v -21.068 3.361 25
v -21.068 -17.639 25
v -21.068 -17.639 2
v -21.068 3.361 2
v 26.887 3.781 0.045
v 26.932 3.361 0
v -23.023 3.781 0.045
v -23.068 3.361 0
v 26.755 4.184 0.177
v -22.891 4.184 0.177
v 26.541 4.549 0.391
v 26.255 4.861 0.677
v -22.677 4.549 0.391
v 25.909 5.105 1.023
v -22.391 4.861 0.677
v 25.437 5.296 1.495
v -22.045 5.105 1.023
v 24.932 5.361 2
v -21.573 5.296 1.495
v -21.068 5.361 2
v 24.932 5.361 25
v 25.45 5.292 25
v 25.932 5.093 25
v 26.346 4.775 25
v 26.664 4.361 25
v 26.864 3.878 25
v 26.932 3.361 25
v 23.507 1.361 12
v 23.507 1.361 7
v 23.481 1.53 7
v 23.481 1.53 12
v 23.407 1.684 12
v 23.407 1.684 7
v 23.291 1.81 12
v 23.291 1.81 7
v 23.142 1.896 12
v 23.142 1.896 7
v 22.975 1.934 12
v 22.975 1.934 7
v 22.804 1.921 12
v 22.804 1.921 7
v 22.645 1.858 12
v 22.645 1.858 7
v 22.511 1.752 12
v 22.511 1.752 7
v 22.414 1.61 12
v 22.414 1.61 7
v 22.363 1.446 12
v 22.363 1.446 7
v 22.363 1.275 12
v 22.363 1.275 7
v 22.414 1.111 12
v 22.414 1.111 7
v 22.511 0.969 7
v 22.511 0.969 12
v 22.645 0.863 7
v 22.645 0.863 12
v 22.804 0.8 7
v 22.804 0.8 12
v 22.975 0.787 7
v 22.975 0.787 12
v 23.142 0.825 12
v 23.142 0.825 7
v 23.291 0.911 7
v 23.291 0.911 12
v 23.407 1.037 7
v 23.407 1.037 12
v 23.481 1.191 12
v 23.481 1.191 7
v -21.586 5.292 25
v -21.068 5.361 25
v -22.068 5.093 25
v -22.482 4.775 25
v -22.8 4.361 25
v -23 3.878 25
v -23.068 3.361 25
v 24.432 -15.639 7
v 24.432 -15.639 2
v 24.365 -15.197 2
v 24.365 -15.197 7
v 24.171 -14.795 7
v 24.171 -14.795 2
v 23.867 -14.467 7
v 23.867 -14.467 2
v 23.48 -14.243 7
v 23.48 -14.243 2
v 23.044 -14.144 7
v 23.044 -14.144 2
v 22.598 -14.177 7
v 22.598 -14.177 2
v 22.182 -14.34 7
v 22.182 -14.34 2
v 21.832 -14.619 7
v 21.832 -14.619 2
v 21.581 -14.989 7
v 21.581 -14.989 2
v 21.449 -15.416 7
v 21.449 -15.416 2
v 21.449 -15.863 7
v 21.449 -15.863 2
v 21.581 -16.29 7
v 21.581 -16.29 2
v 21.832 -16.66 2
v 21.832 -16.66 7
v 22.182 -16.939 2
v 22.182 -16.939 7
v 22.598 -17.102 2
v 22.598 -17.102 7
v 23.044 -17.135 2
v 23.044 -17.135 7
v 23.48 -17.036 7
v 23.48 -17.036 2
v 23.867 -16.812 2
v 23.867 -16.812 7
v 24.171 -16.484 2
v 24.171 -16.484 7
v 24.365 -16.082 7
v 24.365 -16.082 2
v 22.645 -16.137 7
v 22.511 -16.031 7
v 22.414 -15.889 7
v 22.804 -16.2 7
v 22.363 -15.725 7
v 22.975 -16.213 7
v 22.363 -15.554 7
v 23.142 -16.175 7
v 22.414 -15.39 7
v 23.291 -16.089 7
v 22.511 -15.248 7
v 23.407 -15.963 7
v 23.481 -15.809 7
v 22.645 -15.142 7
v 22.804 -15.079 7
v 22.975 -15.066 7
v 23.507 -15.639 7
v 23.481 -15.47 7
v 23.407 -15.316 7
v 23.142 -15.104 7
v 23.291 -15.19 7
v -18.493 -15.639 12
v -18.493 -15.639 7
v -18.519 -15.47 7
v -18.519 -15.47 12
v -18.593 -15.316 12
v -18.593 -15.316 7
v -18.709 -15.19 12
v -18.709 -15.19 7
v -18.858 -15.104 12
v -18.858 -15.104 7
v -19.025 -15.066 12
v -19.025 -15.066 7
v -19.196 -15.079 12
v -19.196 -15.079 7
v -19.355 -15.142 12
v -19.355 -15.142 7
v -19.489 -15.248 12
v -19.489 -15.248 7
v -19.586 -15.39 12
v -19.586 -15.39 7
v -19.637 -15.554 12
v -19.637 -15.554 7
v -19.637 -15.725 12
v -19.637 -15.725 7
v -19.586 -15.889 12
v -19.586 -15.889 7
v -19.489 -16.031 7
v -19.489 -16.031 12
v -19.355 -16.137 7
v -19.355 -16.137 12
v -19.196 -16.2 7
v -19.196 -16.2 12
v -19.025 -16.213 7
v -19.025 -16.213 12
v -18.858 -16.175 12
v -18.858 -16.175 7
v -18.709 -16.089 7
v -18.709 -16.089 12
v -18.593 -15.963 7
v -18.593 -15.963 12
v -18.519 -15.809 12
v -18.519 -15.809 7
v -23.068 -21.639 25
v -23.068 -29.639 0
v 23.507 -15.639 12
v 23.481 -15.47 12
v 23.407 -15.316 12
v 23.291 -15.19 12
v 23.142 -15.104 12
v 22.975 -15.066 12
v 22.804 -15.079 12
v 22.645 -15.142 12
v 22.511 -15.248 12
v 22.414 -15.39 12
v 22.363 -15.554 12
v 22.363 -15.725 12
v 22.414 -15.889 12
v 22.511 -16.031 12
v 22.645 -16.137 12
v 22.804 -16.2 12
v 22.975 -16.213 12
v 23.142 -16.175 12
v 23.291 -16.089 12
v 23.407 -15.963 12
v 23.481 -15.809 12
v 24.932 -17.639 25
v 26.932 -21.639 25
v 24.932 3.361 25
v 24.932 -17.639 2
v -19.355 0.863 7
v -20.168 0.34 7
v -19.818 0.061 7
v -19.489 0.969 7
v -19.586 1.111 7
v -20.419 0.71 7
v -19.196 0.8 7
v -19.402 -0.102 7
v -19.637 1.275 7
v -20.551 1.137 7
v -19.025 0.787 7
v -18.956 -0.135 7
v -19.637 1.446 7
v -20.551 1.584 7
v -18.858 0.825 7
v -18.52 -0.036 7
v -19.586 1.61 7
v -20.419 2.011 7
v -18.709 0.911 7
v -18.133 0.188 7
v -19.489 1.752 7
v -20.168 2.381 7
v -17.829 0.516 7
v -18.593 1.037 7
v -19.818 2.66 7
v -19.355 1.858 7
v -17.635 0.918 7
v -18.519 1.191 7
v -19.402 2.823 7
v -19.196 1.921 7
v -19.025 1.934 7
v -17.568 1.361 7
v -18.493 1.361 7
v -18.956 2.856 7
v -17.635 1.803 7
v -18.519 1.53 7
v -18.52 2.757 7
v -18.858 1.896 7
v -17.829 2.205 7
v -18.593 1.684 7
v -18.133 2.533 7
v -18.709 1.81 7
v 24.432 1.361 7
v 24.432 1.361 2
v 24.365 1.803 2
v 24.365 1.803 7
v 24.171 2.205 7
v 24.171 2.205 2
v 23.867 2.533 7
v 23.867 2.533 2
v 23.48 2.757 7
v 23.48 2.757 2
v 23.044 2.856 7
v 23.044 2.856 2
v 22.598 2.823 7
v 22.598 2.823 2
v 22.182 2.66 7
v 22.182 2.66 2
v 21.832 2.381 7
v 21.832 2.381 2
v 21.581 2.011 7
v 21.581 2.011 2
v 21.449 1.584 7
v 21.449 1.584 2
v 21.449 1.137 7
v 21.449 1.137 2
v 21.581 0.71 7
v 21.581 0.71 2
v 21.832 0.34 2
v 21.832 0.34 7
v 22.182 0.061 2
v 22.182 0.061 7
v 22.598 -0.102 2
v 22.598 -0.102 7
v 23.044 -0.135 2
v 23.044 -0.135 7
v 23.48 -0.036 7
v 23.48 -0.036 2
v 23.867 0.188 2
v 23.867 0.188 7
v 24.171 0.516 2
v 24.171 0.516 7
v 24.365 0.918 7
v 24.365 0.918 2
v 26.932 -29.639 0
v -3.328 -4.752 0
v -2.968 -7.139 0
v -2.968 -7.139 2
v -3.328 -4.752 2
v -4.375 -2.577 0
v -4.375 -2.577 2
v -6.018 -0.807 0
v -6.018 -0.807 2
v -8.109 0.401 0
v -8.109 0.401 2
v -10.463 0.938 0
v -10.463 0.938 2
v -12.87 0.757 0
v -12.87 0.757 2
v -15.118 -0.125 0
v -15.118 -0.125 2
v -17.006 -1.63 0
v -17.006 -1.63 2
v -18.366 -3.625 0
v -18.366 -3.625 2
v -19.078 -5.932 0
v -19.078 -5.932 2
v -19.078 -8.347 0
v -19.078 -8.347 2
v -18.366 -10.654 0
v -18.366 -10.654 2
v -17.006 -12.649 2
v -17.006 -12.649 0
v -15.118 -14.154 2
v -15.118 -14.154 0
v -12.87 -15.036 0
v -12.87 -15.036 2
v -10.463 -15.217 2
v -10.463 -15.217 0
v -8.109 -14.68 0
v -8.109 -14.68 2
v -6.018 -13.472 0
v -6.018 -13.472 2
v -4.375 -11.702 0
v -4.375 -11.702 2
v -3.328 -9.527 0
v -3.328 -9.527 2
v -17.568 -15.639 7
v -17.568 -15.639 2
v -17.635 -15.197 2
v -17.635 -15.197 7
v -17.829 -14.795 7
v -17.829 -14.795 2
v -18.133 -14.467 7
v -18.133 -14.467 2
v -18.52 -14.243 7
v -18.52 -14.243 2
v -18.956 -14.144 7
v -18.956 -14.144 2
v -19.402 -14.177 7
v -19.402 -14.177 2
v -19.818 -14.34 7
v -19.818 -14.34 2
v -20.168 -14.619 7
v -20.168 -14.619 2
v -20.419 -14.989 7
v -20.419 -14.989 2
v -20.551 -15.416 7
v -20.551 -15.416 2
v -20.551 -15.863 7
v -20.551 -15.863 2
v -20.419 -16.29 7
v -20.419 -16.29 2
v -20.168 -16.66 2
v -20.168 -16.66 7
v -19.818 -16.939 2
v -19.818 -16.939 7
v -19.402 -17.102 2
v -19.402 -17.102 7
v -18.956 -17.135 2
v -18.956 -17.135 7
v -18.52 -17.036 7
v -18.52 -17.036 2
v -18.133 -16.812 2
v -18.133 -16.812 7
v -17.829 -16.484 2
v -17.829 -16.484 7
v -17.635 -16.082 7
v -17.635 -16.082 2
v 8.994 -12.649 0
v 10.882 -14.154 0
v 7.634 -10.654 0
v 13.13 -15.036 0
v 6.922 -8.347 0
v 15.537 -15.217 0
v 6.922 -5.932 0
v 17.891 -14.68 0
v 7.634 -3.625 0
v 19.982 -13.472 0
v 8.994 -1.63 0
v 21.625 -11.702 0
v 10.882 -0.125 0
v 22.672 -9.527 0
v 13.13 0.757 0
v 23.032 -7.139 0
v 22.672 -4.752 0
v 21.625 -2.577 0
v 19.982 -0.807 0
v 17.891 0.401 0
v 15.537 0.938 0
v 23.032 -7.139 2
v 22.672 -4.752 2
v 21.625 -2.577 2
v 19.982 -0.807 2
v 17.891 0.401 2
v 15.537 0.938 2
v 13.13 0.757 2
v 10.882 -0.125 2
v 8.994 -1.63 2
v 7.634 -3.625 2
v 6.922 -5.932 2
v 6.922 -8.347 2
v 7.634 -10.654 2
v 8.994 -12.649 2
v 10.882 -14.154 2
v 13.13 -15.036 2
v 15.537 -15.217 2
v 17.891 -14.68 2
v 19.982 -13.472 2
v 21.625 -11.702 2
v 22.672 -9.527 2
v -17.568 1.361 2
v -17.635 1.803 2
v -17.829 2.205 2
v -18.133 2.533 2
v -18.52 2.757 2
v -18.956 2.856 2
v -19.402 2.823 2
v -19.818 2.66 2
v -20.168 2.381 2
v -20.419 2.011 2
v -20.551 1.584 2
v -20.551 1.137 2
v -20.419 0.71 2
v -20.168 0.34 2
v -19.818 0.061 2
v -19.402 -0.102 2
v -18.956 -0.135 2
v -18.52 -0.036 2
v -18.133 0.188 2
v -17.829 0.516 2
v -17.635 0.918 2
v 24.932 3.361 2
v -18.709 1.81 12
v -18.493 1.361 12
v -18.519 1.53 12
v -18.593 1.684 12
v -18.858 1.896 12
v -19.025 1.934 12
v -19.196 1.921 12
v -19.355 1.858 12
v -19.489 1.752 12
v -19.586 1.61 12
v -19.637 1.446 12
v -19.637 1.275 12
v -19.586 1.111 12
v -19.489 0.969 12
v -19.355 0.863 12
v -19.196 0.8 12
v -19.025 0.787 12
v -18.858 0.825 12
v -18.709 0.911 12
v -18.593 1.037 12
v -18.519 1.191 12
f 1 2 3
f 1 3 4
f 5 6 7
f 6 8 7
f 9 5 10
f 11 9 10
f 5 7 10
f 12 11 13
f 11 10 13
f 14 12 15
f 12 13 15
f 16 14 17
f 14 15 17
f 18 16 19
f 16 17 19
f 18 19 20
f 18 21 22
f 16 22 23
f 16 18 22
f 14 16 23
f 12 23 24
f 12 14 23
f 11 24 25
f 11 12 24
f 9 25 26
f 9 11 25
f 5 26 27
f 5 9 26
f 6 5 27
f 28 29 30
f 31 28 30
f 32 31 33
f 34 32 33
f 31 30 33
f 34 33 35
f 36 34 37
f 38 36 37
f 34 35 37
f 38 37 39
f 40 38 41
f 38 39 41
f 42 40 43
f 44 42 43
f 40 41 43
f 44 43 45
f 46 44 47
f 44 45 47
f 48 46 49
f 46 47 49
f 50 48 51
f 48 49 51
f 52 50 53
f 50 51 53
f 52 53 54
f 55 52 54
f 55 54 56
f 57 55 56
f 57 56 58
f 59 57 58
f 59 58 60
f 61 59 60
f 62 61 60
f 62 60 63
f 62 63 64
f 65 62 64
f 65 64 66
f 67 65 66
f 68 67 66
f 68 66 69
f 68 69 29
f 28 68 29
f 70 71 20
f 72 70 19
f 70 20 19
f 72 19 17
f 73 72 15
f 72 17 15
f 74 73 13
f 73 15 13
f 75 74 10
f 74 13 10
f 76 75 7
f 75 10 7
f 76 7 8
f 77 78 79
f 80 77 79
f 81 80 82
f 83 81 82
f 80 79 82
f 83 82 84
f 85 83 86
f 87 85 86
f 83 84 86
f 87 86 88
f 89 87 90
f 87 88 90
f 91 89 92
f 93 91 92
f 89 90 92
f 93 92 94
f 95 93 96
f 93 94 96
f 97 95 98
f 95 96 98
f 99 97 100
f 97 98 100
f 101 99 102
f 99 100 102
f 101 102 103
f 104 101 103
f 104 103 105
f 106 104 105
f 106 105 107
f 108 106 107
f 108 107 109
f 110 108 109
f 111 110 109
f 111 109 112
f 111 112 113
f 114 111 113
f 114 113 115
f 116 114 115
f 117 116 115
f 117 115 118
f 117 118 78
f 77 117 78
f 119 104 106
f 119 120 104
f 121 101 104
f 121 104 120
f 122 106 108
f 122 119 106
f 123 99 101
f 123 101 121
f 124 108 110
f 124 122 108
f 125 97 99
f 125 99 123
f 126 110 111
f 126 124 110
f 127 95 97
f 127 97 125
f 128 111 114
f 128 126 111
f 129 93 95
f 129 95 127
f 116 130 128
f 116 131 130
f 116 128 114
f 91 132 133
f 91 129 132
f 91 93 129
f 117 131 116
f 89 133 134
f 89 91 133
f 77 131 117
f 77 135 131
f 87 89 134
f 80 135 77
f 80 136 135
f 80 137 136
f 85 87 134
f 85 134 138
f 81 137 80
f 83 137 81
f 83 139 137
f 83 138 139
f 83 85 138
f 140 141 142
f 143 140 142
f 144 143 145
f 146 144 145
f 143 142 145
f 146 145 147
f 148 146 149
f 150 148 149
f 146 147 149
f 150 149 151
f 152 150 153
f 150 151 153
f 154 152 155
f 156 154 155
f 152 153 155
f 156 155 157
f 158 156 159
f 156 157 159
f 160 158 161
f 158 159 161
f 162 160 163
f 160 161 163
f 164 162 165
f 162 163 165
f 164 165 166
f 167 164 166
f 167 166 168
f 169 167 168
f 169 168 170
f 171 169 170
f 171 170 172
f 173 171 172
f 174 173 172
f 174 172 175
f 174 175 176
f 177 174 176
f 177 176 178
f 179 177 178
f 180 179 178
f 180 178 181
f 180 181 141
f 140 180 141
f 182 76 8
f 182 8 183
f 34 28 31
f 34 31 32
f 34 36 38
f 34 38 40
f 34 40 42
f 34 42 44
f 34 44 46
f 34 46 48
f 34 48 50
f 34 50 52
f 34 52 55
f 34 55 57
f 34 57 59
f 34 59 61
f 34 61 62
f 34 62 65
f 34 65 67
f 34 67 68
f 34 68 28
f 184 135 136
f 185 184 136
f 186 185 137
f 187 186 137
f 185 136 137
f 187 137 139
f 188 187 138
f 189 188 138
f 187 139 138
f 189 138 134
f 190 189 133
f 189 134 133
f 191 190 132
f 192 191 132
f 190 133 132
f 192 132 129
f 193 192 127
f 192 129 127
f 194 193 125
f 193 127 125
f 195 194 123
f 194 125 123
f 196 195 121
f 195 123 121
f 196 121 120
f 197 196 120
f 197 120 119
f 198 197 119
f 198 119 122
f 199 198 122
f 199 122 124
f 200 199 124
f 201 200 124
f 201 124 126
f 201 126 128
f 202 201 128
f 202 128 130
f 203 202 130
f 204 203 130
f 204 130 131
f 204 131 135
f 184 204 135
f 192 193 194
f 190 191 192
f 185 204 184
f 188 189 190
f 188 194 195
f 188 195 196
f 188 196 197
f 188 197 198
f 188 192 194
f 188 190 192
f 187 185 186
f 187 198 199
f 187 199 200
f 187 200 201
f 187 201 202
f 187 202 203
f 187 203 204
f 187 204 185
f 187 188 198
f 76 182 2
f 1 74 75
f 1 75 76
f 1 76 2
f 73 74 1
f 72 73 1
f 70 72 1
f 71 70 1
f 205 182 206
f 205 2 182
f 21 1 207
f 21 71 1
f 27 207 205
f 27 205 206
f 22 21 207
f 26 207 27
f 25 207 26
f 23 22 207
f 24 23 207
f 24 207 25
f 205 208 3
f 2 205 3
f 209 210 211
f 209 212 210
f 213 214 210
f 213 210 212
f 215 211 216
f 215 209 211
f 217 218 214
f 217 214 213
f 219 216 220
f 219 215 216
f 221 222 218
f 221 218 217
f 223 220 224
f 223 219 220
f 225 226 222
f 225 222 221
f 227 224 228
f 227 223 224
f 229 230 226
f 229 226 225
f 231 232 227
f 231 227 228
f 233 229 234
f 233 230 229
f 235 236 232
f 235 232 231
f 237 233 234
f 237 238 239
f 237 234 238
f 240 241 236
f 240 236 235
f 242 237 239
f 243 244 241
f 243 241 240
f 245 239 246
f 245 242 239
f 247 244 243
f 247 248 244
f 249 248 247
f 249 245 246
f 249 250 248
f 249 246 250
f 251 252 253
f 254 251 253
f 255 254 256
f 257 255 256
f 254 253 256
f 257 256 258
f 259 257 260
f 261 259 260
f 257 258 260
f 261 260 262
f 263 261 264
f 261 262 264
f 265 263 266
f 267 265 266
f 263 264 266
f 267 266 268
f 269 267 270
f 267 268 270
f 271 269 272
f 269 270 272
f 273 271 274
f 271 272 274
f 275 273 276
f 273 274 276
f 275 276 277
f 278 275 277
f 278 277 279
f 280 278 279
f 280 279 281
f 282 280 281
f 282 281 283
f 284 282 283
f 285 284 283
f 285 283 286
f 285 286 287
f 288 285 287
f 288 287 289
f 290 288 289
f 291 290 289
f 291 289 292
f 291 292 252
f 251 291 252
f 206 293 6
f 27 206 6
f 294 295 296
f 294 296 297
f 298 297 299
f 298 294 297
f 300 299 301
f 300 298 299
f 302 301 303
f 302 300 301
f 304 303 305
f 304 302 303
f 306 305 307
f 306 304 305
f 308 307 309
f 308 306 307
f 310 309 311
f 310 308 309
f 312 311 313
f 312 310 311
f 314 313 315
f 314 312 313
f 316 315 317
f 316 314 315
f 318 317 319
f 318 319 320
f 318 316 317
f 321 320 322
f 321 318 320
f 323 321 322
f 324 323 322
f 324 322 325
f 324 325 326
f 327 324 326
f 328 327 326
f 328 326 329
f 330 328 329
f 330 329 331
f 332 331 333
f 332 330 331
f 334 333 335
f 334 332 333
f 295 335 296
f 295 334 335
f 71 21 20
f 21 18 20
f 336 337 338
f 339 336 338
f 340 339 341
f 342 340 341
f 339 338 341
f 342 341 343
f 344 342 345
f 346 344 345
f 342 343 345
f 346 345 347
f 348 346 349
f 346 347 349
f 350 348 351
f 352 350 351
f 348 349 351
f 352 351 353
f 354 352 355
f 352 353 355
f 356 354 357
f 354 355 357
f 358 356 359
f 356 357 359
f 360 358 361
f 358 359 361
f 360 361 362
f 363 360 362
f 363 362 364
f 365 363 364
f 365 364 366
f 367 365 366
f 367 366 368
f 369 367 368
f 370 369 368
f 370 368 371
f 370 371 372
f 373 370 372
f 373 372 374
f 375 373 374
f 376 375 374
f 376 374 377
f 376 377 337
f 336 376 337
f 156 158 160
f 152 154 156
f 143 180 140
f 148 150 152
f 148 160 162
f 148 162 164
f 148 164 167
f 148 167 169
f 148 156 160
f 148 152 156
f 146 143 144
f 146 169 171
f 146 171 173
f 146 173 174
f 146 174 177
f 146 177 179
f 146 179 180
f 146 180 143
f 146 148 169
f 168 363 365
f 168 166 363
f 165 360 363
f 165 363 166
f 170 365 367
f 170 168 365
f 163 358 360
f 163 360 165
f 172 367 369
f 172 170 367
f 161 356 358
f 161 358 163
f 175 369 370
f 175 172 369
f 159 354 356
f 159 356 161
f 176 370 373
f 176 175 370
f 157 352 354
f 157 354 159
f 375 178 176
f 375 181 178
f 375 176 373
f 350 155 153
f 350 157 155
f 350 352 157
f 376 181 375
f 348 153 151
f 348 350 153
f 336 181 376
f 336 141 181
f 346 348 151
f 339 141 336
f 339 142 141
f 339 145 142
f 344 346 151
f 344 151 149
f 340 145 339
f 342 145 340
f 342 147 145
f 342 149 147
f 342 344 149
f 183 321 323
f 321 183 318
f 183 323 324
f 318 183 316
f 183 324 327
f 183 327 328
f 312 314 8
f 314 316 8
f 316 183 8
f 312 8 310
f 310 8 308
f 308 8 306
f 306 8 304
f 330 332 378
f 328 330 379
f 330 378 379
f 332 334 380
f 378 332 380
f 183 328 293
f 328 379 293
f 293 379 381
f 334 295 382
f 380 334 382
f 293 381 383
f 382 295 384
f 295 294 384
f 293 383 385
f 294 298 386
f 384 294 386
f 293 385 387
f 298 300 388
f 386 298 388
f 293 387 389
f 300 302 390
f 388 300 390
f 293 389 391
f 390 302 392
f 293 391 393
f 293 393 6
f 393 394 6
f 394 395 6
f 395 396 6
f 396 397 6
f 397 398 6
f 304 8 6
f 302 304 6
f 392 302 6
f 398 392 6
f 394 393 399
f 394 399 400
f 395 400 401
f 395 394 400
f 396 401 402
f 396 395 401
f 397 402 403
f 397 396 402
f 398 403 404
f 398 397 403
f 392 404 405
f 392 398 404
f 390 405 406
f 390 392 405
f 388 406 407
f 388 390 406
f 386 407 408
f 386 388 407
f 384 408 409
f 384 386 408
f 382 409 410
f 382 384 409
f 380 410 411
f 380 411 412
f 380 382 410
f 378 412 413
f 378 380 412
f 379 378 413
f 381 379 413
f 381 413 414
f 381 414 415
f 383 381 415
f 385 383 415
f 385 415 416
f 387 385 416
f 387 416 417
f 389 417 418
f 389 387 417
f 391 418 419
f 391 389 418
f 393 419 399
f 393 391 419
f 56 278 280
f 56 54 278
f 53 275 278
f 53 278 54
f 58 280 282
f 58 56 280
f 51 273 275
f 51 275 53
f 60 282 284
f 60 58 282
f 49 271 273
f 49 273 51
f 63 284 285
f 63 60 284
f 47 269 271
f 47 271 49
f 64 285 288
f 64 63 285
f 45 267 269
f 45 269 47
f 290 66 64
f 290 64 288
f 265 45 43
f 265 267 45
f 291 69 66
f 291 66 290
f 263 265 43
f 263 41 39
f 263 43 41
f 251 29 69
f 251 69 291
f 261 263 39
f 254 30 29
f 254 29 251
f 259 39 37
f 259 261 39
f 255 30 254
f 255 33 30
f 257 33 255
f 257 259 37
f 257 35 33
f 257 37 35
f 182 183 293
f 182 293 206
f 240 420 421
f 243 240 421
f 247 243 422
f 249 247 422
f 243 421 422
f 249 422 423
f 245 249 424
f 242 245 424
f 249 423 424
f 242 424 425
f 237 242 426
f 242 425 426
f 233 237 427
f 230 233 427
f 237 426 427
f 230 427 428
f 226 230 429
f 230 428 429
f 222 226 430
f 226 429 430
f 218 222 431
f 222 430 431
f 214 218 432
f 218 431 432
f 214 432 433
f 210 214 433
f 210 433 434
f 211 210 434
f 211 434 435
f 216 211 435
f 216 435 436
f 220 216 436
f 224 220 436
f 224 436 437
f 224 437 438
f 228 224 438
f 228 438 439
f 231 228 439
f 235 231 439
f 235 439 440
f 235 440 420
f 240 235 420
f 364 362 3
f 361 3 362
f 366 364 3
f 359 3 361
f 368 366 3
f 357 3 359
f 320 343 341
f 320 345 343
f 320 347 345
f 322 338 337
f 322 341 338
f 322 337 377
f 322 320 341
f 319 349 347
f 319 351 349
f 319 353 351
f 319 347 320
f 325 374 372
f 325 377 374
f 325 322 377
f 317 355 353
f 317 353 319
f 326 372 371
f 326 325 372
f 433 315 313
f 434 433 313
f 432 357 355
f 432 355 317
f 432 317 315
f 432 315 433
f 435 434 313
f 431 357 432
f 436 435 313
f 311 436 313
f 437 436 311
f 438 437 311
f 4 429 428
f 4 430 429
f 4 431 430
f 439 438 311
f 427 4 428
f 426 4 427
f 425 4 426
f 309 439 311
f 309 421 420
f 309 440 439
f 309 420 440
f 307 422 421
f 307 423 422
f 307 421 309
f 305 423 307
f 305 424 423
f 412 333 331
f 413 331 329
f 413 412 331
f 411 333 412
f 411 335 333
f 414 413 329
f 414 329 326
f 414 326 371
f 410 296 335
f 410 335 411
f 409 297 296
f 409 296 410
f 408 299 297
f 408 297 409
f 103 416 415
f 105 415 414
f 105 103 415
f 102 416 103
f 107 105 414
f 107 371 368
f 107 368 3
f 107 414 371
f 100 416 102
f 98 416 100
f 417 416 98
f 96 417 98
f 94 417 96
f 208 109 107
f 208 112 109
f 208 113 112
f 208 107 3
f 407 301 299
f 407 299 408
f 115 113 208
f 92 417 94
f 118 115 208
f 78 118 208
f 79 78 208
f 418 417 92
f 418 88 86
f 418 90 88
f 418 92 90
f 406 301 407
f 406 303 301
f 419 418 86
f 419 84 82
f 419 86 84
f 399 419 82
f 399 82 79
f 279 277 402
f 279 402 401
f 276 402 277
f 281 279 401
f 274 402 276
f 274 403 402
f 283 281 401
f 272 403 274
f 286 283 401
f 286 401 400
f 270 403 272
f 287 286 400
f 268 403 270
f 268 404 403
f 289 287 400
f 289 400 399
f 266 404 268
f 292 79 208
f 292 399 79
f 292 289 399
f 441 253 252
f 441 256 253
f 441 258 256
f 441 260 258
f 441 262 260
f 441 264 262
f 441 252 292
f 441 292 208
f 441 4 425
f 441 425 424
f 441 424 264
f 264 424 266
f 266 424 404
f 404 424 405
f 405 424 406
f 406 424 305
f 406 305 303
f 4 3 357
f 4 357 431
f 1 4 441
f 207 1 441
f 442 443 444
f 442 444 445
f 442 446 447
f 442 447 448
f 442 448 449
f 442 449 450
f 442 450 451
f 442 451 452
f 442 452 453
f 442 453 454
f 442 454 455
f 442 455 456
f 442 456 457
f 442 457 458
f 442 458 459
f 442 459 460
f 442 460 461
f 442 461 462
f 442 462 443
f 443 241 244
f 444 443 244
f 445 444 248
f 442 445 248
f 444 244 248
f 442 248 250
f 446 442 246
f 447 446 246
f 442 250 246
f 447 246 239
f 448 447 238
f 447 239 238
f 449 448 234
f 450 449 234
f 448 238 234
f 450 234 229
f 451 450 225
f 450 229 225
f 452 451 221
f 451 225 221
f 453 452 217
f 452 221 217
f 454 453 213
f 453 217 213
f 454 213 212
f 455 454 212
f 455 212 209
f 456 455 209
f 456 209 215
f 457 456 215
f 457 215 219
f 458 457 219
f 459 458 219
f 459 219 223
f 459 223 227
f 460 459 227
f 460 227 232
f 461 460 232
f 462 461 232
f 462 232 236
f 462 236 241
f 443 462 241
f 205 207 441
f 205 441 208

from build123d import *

# Parameters (mm, degrees)
F0_W     = 46
F0_H     = 2
F0_R     = 1.5
F0_R_2   = 0.575
F0_H_2   = 21
F0_R_3   = 8.1
F1_DEPTH = 2
F2_DEPTH = 25
F3_DEPTH = 7
F4_DEPTH = 12
F5_R     = 2
F7_DEPTH = 52


with BuildPart() as f1:
    # F0 (on Top) → F1 (new body)
    with BuildSketch(Plane.XY):
        with Locations((1.93201, 4.360505)):
            Rectangle(F0_W, F0_H)
        with Locations((-19.06799, 1.360505)):
            Circle(F0_R)
        with Locations((-19.06799, 1.360505)):
            Circle(F0_R_2, mode=Mode.SUBTRACT)
        with Locations((22.93201, -15.639495)):
            Circle(F0_R)
        with Locations((22.93201, -15.639495)):
            Circle(F0_R_2, mode=Mode.SUBTRACT)
        with Locations((22.93201, 1.360505)):
            Circle(F0_R)
        with Locations((22.93201, 1.360505)):
            Circle(F0_R_2, mode=Mode.SUBTRACT)
        with Locations((-19.06799, -15.639495)):
            Circle(F0_R)
        with Locations((-19.06799, -15.639495)):
            Circle(F0_R_2, mode=Mode.SUBTRACT)
        with Locations((1.93201, -7.139495)):
            Rectangle(F0_W, F0_H_2)
        with Locations((-19.06799, -15.639495)):
            Circle(F0_R, mode=Mode.SUBTRACT)
        with Locations((22.93201, -15.639495)):
            Circle(F0_R, mode=Mode.SUBTRACT)
        with Locations((-11.06799, -7.139495)):
            Circle(F0_R_3, mode=Mode.SUBTRACT)
        with Locations((-19.06799, 1.360505)):
            Circle(F0_R, mode=Mode.SUBTRACT)
        with Locations((14.93201, -7.139495)):
            Circle(F0_R_3, mode=Mode.SUBTRACT)
        with Locations((22.93201, 1.360505)):
            Circle(F0_R, mode=Mode.SUBTRACT)
        Polygon((-21.06799, 5.360505), (-23.06799, 5.360505), (-23.06799, -19.639495), (-21.06799, -19.639495), (-21.06799, -17.639495), (-21.06799, 3.360505), align=None)
        Polygon((-21.06799, -17.639495), (-21.06799, -19.639495), (26.93201, -19.639495), (26.93201, -17.639495), (24.93201, -17.639495), align=None)
        Polygon((26.93201, 5.360505), (24.93201, 5.360505), (24.93201, 3.360505), (24.93201, -17.639495), (26.93201, -17.639495), align=None)
    extrude(amount=F1_DEPTH)

    # F0 (on Top) → F2 (join)
    with BuildSketch(Plane.XY):
        Polygon((-21.06799, 5.360505), (-23.06799, 5.360505), (-23.06799, -19.639495), (-21.06799, -19.639495), (-21.06799, -17.639495), (-21.06799, 3.360505), align=None)
        with Locations((1.93201, 4.360505)):
            Rectangle(F0_W, F0_H)
        Polygon((-21.06799, -17.639495), (-21.06799, -19.639495), (26.93201, -19.639495), (26.93201, -17.639495), (24.93201, -17.639495), align=None)
        Polygon((26.93201, 5.360505), (24.93201, 5.360505), (24.93201, 3.360505), (24.93201, -17.639495), (26.93201, -17.639495), align=None)
        Polygon((-21.06799, -19.639495), (-23.06799, -19.639495), (-23.06799, -29.639495), (26.93201, -29.639495), (26.93201, -19.639495), align=None)
    extrude(amount=F2_DEPTH)

    # F0 (on Top) → F3 (join)
    with BuildSketch(Plane.XY):
        with Locations((-19.06799, 1.360505)):
            Circle(F0_R)
        with Locations((-19.06799, 1.360505)):
            Circle(F0_R_2, mode=Mode.SUBTRACT)
        with Locations((-19.06799, -15.639495)):
            Circle(F0_R)
        with Locations((-19.06799, -15.639495)):
            Circle(F0_R_2, mode=Mode.SUBTRACT)
        with Locations((22.93201, 1.360505)):
            Circle(F0_R)
        with Locations((22.93201, 1.360505)):
            Circle(F0_R_2, mode=Mode.SUBTRACT)
        with Locations((22.93201, -15.639495)):
            Circle(F0_R)
        with Locations((22.93201, -15.639495)):
            Circle(F0_R_2, mode=Mode.SUBTRACT)
    extrude(amount=F3_DEPTH)

    # F0 (on Top) → F4 (join)
    with BuildSketch(Plane.XY):
        with Locations((-19.06799, 1.360505)):
            Circle(F0_R_2)
        with Locations((-19.06799, -15.639495)):
            Circle(F0_R_2)
        with Locations((22.93201, -15.639495)):
            Circle(F0_R_2)
        with Locations((22.93201, 1.360505)):
            Circle(F0_R_2)
    extrude(amount=F4_DEPTH)

    # F5
    f5_edges = [f1.edges().sort_by_distance(p)[0] for p in [
        (1.93201, 5.360505, 0),
        (26.93201, 5.360505, 12.5),
        (-23.06799, 5.360505, 12.5),
    ]]
    fillet(f5_edges, radius=F5_R)

    # F6 (on face) → F7 (cut)
    with BuildSketch(Plane.YZ.offset(26.93201)):
        Polygon((-29.639495, 0), (-21.639495, 25), (-29.639495, 25), align=None)
    extrude(amount=-F7_DEPTH, mode=Mode.SUBTRACT)


solid = f1.part
